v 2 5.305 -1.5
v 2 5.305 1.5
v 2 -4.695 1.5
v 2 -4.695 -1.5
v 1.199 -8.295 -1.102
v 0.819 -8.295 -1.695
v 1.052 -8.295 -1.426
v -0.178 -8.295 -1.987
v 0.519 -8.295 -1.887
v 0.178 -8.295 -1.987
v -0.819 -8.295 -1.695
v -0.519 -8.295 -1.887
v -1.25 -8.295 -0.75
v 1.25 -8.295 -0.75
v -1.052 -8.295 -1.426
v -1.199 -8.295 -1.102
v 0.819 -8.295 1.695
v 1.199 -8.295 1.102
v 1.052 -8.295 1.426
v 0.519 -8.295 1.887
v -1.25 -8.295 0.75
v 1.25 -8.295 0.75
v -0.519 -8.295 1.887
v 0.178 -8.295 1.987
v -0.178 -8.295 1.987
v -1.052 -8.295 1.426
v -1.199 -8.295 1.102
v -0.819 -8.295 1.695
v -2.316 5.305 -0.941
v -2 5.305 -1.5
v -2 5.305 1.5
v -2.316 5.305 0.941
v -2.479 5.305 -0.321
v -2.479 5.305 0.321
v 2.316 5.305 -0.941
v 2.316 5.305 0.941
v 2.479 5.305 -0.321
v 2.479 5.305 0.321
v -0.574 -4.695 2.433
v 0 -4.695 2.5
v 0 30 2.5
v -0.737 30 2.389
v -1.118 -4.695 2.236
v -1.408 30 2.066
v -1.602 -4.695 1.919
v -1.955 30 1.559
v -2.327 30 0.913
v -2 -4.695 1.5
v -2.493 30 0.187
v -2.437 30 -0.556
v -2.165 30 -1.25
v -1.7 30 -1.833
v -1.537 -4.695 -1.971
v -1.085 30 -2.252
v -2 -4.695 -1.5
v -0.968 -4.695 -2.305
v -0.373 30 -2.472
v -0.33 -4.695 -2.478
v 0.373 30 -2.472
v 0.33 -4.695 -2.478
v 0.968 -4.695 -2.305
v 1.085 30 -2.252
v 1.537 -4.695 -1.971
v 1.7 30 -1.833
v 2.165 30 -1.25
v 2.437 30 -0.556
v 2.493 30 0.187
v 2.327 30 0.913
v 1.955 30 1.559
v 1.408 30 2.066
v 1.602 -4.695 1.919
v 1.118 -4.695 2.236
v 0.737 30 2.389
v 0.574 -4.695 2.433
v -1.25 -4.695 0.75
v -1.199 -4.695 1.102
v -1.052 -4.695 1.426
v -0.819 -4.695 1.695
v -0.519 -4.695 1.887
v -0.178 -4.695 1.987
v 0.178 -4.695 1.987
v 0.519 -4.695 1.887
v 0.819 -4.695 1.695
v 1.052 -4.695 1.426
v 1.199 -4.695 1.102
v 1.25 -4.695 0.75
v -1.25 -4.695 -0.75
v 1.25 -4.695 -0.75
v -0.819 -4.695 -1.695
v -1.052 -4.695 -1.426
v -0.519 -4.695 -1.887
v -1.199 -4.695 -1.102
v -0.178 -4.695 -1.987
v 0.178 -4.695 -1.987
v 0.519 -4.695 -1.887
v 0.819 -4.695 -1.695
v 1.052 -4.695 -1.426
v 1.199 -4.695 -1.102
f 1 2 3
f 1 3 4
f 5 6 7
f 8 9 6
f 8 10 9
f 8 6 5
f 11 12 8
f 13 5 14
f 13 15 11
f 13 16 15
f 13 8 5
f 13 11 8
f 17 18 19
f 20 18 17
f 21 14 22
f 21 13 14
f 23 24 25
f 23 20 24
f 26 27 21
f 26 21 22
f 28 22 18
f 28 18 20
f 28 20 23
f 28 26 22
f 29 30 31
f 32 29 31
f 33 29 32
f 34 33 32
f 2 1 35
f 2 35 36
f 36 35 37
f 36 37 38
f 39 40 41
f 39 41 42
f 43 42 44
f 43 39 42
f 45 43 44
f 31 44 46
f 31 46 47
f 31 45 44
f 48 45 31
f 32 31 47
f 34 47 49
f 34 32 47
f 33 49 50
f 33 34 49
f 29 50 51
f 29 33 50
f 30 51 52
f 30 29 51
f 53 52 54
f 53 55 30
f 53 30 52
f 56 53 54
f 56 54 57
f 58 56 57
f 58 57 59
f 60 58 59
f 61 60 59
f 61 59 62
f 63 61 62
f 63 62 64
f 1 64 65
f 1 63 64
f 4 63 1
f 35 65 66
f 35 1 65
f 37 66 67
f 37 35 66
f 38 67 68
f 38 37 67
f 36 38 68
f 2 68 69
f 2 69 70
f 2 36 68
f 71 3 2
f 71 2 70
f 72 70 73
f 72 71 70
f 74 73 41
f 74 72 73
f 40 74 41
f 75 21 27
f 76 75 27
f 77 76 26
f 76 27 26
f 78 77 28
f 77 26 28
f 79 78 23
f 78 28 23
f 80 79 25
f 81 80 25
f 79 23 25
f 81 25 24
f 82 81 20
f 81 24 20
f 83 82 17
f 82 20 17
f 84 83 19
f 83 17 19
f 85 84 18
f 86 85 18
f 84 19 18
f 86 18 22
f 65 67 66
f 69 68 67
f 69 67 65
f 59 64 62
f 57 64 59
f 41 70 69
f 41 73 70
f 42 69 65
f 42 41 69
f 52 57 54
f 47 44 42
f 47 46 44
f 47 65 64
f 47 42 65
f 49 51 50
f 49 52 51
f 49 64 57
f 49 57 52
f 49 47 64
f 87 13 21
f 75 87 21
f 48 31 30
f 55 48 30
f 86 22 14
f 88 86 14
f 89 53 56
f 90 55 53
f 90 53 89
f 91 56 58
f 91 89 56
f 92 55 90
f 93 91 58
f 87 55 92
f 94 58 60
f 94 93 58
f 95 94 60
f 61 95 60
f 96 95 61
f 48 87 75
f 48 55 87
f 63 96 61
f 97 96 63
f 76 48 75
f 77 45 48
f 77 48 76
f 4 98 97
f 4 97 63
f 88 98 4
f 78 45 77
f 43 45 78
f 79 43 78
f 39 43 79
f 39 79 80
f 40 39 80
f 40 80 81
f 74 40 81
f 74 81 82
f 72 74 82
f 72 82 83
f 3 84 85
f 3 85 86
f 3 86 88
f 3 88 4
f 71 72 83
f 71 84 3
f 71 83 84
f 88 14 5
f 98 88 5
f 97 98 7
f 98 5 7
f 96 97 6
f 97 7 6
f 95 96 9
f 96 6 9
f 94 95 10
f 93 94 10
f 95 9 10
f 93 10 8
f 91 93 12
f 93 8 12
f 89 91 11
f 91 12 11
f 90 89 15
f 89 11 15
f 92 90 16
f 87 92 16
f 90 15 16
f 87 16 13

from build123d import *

# Parameters (mm, degrees)
SKETCH1_R           = 2.5
BOSS_EXTRUDE1_DEPTH = 50
BOSS_EXTRUDE2_START = 8.295452371
SKETCH2_R           = 2.5
BOSS_EXTRUDE2_DEPTH = 8.295452371
SKETCH4_OUTSIDE_W   = 18.744
SKETCH4_OUTSIDE_H   = 18.744
CUT_EXTRUDE1_DEPTH  = 3.6
CUT_EXTRUDE2_DEPTH  = 10
CUT_EXTRUDE3_START  = -20
SKETCH7_R           = 2.5
CUT_EXTRUDE3_DEPTH  = 20


with BuildPart() as part:
    # Sketch1 → Boss-Extrude1 (new body)
    with BuildSketch(Plane(origin=(0, 0, 0), x_dir=(1, 0, 0), z_dir=(0, 1, 0))):
        with Locations(Location((0, 0, 0), (0, 0, 270))):
            Circle(SKETCH1_R)
    extrude(amount=BOSS_EXTRUDE1_DEPTH)

    # Sketch2 → Boss-Extrude2 (add)
    with BuildSketch(Plane(origin=(0, 0, 0), x_dir=(-1, 0, 0), z_dir=(0, -1, 0)).offset(BOSS_EXTRUDE2_START)):
        with Locations(Location((0, 0, 0), (0, 0, 270))):
            Circle(SKETCH2_R)
    extrude(amount=-BOSS_EXTRUDE2_DEPTH)

    # Sketch4 outside → Cut-Extrude1 (cut)
    with BuildSketch(Plane.XZ.offset(8.295452371)):
        Rectangle(SKETCH4_OUTSIDE_W, SKETCH4_OUTSIDE_H)
        with BuildLine():
            Line((1.25, 0.75), (1.25, -0.75))
            ThreePointArc((1.25, -0.75), (0, -2), (-1.25, -0.75))
            Line((-1.25, -0.75), (-1.25, 0.75))
            ThreePointArc((-1.25, 0.75), (0, 2), (1.25, 0.75))
        make_face(mode=Mode.SUBTRACT)
    extrude(amount=-CUT_EXTRUDE1_DEPTH, mode=Mode.SUBTRACT)

    # Sketch5 → Cut-Extrude2 (cut)
    with BuildSketch(Plane(origin=(0, -4.695452371, 0), x_dir=(-1, 0, 0), z_dir=(0, -1, 0))):
        with BuildLine():
            Line((2, -1.5), (2, 1.5))
            ThreePointArc((2, 1.5), (2.5, 0), (2, -1.5))
        make_face()
        with BuildLine():
            Line((-2, -1.5), (-2, 1.5))
            ThreePointArc((-2, 1.5), (-2.5, 0), (-2, -1.5))
        make_face()
    extrude(amount=-CUT_EXTRUDE2_DEPTH, mode=Mode.SUBTRACT)

    # Sketch7 → Cut-Extrude3 (cut)
    with BuildSketch(Plane(origin=(0, 50, 0), x_dir=(1, 0, 0), z_dir=(0, 1, 0)).offset(CUT_EXTRUDE3_START)):
        with Locations(Location((0, 0, 0), (0, 0, 143.130102354))):
            Circle(SKETCH7_R)
    extrude(amount=CUT_EXTRUDE3_DEPTH, mode=Mode.SUBTRACT)


solid = part.part
